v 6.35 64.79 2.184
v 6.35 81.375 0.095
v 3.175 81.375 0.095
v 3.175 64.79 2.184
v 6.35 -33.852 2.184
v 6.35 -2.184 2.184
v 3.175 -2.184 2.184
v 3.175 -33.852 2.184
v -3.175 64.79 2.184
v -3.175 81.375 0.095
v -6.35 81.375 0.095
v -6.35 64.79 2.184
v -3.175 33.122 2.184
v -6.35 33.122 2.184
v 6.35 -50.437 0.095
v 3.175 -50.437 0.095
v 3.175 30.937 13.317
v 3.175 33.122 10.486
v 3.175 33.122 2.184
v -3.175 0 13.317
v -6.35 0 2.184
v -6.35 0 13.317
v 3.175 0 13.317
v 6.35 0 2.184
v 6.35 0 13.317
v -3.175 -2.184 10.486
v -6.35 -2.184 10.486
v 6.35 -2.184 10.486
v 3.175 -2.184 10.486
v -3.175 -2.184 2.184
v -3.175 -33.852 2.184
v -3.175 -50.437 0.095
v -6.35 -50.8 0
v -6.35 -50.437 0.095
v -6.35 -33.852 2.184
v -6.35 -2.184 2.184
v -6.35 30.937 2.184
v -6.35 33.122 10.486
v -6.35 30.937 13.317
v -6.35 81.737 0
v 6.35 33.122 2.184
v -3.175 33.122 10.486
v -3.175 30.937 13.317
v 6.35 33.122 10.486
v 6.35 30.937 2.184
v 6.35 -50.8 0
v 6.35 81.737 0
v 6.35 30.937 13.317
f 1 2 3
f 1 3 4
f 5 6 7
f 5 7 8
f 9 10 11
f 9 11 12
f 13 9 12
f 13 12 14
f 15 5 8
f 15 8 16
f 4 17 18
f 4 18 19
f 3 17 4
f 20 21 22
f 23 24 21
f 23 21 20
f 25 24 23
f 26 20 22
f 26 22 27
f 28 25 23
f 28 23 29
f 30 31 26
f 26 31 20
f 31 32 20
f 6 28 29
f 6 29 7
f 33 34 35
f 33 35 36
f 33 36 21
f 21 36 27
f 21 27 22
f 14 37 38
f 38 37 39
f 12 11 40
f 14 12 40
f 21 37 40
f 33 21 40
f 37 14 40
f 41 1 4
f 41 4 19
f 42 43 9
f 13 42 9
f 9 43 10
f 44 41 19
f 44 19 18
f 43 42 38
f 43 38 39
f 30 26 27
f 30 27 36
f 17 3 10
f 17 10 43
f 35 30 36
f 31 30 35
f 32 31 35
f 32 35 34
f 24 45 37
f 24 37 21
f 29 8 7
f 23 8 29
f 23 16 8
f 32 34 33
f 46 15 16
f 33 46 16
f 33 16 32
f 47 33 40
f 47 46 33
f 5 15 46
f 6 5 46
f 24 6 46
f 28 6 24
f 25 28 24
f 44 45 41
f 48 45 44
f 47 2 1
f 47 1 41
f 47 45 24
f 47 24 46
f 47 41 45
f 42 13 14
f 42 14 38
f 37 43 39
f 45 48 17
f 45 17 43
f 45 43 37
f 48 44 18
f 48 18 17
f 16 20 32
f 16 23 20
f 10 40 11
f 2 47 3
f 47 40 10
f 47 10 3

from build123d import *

# Parameters (mm, degrees)
F0_W          = 30.9372
F0_H          = 2.1844
F1_DEPTH      = 6.35
F1_DEPTH_BACK = 6.35
F2_DEPTH      = 3.175
F2_DEPTH_BACK = 3.175


with BuildPart() as f1:
    # F0 (on Right) → F1 (new body, two sides)
    with BuildSketch(Plane.YZ) as f1_sk:
        Polygon((-50.8, 0), (0, 0), (0, 2.1844), (-2.1844, 2.1844), (-33.852487, 2.1844), (-50.437497, 0.095026), align=None)
        with Locations((15.4686, 1.0922)):
            Rectangle(F0_W, F0_H)
        Polygon((30.9372, 2.1844), (30.9372, 0), (81.7372, 0), (81.374697, 0.095026), (64.789687, 2.1844), (33.1216, 2.1844), align=None)
        Polygon((30.9372, 13.316668), (30.9372, 2.1844), (33.1216, 2.1844), (33.1216, 10.485845), align=None)
        Polygon((-2.1844, 2.1844), (0, 2.1844), (0, 13.316668), (-2.1844, 10.485845), align=None)
    extrude(amount=F1_DEPTH)
    extrude(f1_sk.sketch, amount=-F1_DEPTH_BACK)

    # F0 (on Right) → F2 (join, two sides)
    with BuildSketch(Plane.YZ) as f2_sk:
        Polygon((-2.1844, 10.485845), (0, 13.316668), (-50.437497, 0.095026), (-33.852487, 2.1844), (-10.214526, 8.380835), align=None)
        Polygon((81.374697, 0.095026), (30.9372, 13.316668), (33.1216, 10.485845), (41.151726, 8.380835), (64.789687, 2.1844), align=None)
        Polygon((33.1216, 10.485845), (33.1216, 2.1844), (64.789687, 2.1844), (41.151726, 8.380835), align=None)
        Polygon((-33.852487, 2.1844), (-2.1844, 2.1844), (-2.1844, 10.485845), (-10.214526, 8.380835), align=None)
    extrude(amount=F2_DEPTH)
    extrude(f2_sk.sketch, amount=-F2_DEPTH_BACK)


solid = f1.part
